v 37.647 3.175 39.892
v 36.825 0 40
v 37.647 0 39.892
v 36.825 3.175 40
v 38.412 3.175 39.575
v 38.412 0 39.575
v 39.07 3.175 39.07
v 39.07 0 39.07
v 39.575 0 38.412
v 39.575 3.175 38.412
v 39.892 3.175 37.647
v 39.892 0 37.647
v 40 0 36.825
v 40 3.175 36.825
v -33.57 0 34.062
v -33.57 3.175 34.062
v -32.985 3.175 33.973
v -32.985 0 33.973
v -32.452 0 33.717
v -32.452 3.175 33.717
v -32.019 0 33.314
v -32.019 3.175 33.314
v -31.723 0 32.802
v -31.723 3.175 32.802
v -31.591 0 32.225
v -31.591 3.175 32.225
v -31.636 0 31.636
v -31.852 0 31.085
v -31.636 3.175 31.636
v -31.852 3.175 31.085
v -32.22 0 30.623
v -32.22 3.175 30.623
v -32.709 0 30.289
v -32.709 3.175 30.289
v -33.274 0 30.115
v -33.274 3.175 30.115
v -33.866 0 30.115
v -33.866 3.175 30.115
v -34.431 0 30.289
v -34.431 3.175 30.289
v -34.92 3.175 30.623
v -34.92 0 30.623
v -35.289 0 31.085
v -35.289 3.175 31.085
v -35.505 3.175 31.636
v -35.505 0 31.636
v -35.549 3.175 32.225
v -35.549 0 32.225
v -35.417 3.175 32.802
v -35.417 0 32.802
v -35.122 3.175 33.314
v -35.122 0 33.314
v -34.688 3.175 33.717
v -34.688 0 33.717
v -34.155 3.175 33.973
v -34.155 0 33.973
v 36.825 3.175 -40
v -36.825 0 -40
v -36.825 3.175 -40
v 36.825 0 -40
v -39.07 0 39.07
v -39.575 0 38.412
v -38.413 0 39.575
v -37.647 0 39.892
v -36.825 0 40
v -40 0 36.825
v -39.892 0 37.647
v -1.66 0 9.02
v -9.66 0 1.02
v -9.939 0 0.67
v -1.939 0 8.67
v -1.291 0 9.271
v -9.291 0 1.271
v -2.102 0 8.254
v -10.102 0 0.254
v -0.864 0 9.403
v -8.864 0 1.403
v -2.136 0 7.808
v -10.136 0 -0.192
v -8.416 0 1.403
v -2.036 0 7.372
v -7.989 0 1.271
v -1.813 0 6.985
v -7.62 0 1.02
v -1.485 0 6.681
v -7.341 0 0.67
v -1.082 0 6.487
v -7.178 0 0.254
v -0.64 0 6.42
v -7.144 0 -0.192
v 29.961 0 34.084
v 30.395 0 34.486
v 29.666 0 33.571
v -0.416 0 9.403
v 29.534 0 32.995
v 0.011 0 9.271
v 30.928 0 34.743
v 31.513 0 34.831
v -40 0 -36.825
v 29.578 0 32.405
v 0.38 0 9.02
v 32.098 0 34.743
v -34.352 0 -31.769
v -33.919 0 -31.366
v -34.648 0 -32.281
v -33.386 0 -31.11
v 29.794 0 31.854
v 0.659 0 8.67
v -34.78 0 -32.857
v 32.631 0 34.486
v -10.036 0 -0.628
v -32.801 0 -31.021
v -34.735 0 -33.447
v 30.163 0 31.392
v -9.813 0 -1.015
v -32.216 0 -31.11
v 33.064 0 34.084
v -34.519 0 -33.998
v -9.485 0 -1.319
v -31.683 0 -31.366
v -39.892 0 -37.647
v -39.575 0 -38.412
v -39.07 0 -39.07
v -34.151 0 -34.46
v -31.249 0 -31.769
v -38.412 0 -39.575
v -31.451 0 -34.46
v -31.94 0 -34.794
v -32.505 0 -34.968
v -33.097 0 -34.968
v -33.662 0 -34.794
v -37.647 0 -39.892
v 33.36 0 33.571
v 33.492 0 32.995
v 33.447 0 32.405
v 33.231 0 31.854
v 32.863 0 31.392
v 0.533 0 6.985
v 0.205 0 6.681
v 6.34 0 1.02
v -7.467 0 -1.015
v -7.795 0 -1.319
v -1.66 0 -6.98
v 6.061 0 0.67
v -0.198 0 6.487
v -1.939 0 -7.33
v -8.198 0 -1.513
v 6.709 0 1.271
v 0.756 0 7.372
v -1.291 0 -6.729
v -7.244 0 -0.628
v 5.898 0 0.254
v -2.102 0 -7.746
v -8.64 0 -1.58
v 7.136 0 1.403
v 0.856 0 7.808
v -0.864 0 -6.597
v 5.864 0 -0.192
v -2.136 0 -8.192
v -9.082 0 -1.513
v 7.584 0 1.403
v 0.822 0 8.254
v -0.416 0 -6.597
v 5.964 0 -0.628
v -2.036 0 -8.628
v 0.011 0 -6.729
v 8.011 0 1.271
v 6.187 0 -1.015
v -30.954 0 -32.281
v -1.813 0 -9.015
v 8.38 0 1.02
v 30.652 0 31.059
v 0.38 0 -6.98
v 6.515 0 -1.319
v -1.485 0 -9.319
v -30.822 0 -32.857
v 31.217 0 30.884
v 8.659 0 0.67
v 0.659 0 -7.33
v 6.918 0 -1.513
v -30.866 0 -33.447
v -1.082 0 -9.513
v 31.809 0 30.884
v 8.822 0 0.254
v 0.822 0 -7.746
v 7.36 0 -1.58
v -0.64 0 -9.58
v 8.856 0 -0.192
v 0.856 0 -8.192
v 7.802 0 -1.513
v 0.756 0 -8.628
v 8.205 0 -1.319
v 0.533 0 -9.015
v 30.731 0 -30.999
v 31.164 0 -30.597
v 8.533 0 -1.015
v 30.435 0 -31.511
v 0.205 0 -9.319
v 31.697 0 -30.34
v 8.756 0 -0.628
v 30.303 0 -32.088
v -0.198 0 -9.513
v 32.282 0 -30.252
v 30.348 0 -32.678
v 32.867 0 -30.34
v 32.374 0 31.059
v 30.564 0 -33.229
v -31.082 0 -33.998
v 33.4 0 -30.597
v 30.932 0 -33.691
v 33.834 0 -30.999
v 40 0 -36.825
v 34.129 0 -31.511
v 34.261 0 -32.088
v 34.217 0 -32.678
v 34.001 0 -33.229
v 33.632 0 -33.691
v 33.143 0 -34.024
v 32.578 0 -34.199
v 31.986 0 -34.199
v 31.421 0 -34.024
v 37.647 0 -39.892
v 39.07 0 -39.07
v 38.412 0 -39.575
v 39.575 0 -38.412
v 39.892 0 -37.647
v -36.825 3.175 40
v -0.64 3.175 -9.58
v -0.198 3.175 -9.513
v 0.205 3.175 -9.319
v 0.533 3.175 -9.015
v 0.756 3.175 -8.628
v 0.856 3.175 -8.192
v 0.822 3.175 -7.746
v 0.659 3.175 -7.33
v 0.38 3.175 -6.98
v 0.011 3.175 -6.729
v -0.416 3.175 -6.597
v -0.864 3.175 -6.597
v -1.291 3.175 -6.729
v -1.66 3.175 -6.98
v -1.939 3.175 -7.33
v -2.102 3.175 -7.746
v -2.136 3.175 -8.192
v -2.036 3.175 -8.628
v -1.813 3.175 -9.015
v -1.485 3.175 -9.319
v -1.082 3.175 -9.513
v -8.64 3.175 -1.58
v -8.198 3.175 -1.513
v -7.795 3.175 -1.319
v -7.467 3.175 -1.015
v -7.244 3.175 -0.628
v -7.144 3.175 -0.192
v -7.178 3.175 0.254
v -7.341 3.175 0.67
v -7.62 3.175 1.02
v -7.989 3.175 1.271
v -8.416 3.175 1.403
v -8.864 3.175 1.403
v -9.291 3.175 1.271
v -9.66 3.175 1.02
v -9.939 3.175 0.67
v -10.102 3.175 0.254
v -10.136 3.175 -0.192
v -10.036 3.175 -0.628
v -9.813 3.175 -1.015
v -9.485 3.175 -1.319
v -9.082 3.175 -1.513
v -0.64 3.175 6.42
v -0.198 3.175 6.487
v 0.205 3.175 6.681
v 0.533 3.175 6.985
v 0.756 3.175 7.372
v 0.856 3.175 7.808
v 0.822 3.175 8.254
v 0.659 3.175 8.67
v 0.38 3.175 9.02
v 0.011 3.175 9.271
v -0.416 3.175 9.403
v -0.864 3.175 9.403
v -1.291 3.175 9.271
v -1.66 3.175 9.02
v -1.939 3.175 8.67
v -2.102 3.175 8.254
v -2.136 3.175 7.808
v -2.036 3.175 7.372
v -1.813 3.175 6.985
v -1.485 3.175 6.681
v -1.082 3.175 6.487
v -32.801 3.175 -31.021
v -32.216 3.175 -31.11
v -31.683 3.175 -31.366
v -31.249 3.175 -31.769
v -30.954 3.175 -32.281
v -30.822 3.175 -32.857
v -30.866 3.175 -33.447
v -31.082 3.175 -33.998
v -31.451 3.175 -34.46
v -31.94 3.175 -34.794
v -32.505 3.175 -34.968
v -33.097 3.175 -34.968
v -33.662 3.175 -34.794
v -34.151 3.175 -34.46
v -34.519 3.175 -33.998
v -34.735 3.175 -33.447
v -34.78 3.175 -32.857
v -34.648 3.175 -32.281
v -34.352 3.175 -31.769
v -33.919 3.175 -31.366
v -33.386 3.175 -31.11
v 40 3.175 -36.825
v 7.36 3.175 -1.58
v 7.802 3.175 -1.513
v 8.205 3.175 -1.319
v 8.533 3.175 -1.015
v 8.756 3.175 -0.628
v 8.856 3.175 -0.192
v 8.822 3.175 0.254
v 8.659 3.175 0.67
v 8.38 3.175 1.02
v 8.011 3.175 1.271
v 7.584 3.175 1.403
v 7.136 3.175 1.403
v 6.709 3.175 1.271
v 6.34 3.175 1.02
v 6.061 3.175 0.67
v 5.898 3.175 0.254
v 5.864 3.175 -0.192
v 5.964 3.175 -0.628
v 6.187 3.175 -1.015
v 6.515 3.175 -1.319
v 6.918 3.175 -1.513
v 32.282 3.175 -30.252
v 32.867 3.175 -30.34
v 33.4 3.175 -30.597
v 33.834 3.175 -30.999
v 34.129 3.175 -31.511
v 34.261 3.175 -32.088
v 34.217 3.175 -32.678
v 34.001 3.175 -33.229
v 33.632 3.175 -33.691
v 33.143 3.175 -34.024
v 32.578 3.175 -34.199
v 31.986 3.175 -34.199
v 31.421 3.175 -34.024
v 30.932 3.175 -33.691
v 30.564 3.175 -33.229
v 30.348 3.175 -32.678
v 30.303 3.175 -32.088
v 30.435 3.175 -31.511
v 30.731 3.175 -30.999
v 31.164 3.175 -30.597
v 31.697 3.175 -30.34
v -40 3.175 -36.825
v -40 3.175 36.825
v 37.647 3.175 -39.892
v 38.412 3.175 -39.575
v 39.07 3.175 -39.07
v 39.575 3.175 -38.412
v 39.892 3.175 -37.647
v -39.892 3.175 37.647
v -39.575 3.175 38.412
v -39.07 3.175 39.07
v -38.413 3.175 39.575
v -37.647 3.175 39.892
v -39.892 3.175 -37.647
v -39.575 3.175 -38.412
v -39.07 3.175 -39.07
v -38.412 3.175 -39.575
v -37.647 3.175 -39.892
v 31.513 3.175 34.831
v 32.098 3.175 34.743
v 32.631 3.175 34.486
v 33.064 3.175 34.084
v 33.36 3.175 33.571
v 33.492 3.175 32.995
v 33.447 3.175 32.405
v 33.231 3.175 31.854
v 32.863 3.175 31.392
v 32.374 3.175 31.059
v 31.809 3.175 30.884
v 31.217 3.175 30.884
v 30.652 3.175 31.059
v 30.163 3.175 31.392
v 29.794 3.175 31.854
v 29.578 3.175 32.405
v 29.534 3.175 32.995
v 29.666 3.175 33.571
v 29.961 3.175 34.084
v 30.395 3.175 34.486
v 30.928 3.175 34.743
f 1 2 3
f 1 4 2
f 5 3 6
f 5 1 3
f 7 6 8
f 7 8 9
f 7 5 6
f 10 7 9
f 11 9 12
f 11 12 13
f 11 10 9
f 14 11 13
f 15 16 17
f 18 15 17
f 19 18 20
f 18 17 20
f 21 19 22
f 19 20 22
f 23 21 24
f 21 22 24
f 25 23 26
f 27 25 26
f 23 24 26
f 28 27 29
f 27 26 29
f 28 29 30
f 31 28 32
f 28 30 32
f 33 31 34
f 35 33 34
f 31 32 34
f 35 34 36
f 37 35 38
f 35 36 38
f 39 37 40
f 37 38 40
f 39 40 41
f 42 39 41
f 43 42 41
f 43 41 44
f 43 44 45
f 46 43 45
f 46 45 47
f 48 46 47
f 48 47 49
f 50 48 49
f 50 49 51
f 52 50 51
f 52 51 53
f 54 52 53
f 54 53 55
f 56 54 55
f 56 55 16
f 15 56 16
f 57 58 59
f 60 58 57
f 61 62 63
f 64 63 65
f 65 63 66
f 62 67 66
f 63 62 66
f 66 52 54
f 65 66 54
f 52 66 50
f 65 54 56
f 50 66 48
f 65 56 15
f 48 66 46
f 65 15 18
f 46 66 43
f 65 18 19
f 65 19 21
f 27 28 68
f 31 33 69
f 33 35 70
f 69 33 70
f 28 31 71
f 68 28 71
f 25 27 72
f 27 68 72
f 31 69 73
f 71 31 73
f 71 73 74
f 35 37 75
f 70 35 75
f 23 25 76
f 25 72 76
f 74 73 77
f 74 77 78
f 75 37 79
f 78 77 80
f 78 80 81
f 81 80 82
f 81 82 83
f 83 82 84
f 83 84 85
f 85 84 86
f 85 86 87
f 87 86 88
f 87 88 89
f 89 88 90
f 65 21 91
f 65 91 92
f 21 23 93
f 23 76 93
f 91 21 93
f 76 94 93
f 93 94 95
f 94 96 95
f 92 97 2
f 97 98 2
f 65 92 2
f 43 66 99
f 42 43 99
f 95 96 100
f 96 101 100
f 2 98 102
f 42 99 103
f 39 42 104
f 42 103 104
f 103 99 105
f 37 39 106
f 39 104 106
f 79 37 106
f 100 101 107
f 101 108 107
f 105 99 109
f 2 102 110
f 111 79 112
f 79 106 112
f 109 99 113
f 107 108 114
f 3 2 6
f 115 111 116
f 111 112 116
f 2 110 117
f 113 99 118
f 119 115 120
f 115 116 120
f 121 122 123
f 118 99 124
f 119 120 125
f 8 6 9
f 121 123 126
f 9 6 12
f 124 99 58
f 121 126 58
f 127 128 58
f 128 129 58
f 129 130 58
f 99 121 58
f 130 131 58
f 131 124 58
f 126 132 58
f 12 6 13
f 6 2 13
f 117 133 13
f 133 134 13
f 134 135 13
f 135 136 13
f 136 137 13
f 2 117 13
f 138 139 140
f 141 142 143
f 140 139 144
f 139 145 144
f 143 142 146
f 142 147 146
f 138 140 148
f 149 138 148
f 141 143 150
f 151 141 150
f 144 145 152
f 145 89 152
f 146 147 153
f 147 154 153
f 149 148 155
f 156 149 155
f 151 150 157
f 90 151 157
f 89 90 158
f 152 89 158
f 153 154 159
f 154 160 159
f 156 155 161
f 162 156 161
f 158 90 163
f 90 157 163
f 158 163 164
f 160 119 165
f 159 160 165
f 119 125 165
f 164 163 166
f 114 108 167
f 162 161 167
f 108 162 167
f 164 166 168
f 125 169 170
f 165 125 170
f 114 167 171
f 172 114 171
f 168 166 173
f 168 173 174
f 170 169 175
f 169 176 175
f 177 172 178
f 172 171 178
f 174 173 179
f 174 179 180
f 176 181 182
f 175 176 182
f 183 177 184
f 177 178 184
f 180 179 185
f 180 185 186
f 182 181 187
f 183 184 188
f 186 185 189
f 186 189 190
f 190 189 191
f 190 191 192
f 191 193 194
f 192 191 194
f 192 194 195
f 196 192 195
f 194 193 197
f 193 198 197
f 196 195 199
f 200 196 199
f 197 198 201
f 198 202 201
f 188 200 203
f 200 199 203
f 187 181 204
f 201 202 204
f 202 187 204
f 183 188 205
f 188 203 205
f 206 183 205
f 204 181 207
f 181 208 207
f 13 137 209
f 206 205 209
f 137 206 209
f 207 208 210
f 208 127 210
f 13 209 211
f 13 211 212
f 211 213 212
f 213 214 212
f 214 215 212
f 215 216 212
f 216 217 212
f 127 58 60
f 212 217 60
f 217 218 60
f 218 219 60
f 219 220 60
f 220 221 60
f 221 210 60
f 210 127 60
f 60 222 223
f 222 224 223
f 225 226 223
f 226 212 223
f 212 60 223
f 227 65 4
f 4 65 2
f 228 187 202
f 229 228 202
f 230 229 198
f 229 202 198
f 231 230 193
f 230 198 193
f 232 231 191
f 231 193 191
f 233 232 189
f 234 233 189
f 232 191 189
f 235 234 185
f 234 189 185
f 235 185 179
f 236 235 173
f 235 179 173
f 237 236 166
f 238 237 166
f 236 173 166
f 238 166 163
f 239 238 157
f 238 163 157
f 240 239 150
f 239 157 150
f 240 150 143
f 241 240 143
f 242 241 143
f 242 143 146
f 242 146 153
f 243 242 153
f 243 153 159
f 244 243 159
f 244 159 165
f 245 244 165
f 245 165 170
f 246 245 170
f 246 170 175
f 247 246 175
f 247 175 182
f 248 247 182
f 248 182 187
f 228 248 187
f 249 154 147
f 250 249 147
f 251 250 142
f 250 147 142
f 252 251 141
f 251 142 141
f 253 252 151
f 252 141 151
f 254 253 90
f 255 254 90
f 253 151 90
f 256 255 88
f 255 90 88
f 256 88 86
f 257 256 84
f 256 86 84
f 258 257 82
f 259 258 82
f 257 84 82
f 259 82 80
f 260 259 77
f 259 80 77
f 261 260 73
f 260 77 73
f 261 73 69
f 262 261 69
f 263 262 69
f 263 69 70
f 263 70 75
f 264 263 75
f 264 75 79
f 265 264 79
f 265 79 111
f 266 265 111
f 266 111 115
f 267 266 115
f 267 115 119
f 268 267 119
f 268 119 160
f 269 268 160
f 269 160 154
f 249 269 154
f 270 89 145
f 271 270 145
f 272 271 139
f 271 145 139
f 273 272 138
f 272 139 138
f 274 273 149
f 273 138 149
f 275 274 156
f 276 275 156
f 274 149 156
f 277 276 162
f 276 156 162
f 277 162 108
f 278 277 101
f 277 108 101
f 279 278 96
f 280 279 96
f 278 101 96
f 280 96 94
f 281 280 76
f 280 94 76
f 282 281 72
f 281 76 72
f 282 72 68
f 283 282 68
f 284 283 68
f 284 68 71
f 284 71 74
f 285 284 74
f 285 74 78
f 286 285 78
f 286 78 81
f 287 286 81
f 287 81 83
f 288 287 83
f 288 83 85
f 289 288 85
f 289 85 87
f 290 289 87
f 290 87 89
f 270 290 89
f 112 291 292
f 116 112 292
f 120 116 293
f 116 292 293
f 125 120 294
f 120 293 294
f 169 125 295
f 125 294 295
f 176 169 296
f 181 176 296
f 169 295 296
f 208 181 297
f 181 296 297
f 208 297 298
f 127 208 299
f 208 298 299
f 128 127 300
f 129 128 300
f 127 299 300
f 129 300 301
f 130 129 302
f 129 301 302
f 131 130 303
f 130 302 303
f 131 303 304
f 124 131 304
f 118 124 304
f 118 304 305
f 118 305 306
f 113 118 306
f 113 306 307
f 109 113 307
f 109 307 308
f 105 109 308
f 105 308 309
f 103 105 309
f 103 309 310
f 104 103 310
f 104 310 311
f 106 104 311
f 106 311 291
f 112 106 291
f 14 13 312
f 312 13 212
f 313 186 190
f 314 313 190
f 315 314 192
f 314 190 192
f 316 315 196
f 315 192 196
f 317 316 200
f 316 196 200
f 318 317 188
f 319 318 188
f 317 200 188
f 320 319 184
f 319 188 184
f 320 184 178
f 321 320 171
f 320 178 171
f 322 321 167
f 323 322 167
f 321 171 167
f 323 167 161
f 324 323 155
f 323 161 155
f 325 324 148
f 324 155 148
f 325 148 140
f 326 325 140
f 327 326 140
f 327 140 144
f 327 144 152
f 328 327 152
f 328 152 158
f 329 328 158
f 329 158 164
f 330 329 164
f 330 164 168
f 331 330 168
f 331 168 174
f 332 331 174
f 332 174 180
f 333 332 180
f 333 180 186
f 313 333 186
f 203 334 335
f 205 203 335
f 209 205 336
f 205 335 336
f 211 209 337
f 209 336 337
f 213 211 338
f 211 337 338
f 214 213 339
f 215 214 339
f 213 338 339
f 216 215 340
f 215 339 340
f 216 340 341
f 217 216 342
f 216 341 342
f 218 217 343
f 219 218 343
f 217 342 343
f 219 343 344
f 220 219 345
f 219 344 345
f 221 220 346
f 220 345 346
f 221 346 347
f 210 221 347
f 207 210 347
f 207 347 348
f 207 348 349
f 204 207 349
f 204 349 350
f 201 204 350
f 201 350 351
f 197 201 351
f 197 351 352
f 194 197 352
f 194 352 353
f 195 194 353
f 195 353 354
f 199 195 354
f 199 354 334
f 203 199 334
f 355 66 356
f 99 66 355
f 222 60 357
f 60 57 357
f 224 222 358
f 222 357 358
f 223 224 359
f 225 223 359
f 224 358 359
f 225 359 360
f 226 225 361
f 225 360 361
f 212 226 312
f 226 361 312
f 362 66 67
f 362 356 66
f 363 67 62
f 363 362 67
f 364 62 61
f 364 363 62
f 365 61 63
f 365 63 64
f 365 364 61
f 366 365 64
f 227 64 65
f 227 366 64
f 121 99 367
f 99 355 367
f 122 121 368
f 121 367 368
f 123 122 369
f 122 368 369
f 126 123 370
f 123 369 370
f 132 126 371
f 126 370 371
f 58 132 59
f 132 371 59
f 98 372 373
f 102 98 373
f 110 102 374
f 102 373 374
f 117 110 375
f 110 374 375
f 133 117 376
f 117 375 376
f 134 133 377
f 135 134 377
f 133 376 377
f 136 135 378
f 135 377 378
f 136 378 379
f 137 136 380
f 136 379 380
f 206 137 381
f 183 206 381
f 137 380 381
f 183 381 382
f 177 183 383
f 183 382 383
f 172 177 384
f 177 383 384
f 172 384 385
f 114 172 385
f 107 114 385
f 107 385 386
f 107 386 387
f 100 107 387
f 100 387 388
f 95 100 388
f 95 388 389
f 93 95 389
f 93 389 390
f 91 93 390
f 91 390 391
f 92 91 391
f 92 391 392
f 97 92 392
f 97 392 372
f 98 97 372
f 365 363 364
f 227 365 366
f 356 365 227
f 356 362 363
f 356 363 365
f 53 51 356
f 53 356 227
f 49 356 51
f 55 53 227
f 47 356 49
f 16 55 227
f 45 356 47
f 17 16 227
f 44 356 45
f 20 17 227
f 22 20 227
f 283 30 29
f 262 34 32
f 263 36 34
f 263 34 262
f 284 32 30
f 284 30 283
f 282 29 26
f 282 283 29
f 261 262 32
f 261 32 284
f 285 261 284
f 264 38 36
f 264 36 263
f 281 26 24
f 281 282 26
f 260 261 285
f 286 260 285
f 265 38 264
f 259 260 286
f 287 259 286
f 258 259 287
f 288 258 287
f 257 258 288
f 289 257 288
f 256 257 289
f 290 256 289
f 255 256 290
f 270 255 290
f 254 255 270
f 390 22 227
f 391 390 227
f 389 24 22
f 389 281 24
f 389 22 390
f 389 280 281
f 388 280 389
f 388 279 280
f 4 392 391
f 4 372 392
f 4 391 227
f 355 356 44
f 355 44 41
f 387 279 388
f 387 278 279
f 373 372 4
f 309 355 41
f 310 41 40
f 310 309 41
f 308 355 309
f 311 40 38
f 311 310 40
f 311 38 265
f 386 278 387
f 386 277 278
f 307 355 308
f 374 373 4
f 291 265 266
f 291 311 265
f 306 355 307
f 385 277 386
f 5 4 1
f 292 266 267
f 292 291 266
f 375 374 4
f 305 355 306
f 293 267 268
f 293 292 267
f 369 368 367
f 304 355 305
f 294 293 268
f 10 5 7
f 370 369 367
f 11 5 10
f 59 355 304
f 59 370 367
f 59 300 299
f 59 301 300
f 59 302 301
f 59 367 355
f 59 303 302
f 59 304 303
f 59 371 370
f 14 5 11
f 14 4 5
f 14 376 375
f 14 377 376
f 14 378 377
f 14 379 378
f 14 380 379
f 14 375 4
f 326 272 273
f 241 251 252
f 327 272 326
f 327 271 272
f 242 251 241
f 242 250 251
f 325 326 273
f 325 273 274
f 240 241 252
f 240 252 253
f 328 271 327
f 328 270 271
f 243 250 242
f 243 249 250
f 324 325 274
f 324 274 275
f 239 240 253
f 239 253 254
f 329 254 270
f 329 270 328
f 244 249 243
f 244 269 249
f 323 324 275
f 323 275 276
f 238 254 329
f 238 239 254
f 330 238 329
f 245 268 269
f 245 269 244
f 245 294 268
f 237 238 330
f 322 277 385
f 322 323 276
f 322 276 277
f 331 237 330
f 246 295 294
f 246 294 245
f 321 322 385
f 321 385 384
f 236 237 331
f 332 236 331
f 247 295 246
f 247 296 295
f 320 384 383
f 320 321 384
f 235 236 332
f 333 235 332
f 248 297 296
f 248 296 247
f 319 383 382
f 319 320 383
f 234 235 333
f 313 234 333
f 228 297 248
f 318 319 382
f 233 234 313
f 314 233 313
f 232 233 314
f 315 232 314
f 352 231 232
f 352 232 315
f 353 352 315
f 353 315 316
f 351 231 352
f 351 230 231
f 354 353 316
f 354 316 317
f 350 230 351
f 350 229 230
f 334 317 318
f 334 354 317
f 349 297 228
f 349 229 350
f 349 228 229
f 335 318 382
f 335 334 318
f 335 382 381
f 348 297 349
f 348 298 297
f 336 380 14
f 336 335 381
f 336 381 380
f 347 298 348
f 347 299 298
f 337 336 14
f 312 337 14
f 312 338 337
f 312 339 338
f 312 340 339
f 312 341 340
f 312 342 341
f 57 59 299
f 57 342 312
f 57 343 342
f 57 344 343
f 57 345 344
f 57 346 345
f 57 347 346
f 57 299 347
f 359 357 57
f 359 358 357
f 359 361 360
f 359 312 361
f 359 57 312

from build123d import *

# Parameters (mm, degrees)
SKETCH1_W           = 80
SKETCH1_H           = 80
BOSS_EXTRUDE1_DEPTH = 3.175
SKETCH16_R          = 1.984375
CUT_EXTRUDE8_DEPTH  = 10
FILLET1_R           = 3.175
SKETCH21_R          = 1.5
CUT_EXTRUDE9_DEPTH  = 10


with BuildPart() as part:
    # Sketch1 → Boss-Extrude1 (new body)
    with BuildSketch(Plane(origin=(0, 0, 0), x_dir=(1, 0, 0), z_dir=(0, 1, 0))):
        Rectangle(SKETCH1_W, SKETCH1_H)
    extrude(amount=BOSS_EXTRUDE1_DEPTH)

    # Sketch16 → Cut-Extrude8 (cut)
    with BuildSketch(Plane(origin=(0, 3.175, 0), x_dir=(1, 0, 0), z_dir=(0, 1, 0))):
        with Locations(Location((-32.800817373, 33.005763026, 0), (0, 0, 270))):
            Circle(SKETCH16_R)
        with Locations(Location((32.282136008, 32.236454615, 0), (0, 0, 270))):
            Circle(SKETCH16_R)
        with Locations(Location((31.512827597, -32.846498766, 0), (0, 0, 270))):
            Circle(SKETCH16_R)
        with Locations(Location((-33.570125785, -32.077190355, 0), (0, 0, 270))):
            Circle(SKETCH16_R)
    extrude(amount=-CUT_EXTRUDE8_DEPTH, mode=Mode.SUBTRACT)

    # Fillet1
    fillet1_edges = [part.edges().sort_by_distance(p)[0] for p in [
        (-40, 1.5875, -40),
        (40, 1.5875, -40),
        (40, 1.5875, 40),
        (-40, 1.5875, 40),
    ]]
    fillet(fillet1_edges, radius=FILLET1_R)

    # Sketch21 → Cut-Extrude9 (cut)
    with BuildSketch(Plane.XZ):
        with Locations(Location((-0.64, 7.92, 0), (0, 0, 270))):
            Circle(SKETCH21_R)
        with Locations(Location((7.36, -0.08, 0), (0, 0, 270))):
            Circle(SKETCH21_R)
        with Locations(Location((-0.64, -8.08, 0), (0, 0, 270))):
            Circle(SKETCH21_R)
        with Locations(Location((-8.64, -0.08, 0), (0, 0, 270))):
            Circle(SKETCH21_R)
    extrude(amount=-CUT_EXTRUDE9_DEPTH, mode=Mode.SUBTRACT)


solid = part.part
